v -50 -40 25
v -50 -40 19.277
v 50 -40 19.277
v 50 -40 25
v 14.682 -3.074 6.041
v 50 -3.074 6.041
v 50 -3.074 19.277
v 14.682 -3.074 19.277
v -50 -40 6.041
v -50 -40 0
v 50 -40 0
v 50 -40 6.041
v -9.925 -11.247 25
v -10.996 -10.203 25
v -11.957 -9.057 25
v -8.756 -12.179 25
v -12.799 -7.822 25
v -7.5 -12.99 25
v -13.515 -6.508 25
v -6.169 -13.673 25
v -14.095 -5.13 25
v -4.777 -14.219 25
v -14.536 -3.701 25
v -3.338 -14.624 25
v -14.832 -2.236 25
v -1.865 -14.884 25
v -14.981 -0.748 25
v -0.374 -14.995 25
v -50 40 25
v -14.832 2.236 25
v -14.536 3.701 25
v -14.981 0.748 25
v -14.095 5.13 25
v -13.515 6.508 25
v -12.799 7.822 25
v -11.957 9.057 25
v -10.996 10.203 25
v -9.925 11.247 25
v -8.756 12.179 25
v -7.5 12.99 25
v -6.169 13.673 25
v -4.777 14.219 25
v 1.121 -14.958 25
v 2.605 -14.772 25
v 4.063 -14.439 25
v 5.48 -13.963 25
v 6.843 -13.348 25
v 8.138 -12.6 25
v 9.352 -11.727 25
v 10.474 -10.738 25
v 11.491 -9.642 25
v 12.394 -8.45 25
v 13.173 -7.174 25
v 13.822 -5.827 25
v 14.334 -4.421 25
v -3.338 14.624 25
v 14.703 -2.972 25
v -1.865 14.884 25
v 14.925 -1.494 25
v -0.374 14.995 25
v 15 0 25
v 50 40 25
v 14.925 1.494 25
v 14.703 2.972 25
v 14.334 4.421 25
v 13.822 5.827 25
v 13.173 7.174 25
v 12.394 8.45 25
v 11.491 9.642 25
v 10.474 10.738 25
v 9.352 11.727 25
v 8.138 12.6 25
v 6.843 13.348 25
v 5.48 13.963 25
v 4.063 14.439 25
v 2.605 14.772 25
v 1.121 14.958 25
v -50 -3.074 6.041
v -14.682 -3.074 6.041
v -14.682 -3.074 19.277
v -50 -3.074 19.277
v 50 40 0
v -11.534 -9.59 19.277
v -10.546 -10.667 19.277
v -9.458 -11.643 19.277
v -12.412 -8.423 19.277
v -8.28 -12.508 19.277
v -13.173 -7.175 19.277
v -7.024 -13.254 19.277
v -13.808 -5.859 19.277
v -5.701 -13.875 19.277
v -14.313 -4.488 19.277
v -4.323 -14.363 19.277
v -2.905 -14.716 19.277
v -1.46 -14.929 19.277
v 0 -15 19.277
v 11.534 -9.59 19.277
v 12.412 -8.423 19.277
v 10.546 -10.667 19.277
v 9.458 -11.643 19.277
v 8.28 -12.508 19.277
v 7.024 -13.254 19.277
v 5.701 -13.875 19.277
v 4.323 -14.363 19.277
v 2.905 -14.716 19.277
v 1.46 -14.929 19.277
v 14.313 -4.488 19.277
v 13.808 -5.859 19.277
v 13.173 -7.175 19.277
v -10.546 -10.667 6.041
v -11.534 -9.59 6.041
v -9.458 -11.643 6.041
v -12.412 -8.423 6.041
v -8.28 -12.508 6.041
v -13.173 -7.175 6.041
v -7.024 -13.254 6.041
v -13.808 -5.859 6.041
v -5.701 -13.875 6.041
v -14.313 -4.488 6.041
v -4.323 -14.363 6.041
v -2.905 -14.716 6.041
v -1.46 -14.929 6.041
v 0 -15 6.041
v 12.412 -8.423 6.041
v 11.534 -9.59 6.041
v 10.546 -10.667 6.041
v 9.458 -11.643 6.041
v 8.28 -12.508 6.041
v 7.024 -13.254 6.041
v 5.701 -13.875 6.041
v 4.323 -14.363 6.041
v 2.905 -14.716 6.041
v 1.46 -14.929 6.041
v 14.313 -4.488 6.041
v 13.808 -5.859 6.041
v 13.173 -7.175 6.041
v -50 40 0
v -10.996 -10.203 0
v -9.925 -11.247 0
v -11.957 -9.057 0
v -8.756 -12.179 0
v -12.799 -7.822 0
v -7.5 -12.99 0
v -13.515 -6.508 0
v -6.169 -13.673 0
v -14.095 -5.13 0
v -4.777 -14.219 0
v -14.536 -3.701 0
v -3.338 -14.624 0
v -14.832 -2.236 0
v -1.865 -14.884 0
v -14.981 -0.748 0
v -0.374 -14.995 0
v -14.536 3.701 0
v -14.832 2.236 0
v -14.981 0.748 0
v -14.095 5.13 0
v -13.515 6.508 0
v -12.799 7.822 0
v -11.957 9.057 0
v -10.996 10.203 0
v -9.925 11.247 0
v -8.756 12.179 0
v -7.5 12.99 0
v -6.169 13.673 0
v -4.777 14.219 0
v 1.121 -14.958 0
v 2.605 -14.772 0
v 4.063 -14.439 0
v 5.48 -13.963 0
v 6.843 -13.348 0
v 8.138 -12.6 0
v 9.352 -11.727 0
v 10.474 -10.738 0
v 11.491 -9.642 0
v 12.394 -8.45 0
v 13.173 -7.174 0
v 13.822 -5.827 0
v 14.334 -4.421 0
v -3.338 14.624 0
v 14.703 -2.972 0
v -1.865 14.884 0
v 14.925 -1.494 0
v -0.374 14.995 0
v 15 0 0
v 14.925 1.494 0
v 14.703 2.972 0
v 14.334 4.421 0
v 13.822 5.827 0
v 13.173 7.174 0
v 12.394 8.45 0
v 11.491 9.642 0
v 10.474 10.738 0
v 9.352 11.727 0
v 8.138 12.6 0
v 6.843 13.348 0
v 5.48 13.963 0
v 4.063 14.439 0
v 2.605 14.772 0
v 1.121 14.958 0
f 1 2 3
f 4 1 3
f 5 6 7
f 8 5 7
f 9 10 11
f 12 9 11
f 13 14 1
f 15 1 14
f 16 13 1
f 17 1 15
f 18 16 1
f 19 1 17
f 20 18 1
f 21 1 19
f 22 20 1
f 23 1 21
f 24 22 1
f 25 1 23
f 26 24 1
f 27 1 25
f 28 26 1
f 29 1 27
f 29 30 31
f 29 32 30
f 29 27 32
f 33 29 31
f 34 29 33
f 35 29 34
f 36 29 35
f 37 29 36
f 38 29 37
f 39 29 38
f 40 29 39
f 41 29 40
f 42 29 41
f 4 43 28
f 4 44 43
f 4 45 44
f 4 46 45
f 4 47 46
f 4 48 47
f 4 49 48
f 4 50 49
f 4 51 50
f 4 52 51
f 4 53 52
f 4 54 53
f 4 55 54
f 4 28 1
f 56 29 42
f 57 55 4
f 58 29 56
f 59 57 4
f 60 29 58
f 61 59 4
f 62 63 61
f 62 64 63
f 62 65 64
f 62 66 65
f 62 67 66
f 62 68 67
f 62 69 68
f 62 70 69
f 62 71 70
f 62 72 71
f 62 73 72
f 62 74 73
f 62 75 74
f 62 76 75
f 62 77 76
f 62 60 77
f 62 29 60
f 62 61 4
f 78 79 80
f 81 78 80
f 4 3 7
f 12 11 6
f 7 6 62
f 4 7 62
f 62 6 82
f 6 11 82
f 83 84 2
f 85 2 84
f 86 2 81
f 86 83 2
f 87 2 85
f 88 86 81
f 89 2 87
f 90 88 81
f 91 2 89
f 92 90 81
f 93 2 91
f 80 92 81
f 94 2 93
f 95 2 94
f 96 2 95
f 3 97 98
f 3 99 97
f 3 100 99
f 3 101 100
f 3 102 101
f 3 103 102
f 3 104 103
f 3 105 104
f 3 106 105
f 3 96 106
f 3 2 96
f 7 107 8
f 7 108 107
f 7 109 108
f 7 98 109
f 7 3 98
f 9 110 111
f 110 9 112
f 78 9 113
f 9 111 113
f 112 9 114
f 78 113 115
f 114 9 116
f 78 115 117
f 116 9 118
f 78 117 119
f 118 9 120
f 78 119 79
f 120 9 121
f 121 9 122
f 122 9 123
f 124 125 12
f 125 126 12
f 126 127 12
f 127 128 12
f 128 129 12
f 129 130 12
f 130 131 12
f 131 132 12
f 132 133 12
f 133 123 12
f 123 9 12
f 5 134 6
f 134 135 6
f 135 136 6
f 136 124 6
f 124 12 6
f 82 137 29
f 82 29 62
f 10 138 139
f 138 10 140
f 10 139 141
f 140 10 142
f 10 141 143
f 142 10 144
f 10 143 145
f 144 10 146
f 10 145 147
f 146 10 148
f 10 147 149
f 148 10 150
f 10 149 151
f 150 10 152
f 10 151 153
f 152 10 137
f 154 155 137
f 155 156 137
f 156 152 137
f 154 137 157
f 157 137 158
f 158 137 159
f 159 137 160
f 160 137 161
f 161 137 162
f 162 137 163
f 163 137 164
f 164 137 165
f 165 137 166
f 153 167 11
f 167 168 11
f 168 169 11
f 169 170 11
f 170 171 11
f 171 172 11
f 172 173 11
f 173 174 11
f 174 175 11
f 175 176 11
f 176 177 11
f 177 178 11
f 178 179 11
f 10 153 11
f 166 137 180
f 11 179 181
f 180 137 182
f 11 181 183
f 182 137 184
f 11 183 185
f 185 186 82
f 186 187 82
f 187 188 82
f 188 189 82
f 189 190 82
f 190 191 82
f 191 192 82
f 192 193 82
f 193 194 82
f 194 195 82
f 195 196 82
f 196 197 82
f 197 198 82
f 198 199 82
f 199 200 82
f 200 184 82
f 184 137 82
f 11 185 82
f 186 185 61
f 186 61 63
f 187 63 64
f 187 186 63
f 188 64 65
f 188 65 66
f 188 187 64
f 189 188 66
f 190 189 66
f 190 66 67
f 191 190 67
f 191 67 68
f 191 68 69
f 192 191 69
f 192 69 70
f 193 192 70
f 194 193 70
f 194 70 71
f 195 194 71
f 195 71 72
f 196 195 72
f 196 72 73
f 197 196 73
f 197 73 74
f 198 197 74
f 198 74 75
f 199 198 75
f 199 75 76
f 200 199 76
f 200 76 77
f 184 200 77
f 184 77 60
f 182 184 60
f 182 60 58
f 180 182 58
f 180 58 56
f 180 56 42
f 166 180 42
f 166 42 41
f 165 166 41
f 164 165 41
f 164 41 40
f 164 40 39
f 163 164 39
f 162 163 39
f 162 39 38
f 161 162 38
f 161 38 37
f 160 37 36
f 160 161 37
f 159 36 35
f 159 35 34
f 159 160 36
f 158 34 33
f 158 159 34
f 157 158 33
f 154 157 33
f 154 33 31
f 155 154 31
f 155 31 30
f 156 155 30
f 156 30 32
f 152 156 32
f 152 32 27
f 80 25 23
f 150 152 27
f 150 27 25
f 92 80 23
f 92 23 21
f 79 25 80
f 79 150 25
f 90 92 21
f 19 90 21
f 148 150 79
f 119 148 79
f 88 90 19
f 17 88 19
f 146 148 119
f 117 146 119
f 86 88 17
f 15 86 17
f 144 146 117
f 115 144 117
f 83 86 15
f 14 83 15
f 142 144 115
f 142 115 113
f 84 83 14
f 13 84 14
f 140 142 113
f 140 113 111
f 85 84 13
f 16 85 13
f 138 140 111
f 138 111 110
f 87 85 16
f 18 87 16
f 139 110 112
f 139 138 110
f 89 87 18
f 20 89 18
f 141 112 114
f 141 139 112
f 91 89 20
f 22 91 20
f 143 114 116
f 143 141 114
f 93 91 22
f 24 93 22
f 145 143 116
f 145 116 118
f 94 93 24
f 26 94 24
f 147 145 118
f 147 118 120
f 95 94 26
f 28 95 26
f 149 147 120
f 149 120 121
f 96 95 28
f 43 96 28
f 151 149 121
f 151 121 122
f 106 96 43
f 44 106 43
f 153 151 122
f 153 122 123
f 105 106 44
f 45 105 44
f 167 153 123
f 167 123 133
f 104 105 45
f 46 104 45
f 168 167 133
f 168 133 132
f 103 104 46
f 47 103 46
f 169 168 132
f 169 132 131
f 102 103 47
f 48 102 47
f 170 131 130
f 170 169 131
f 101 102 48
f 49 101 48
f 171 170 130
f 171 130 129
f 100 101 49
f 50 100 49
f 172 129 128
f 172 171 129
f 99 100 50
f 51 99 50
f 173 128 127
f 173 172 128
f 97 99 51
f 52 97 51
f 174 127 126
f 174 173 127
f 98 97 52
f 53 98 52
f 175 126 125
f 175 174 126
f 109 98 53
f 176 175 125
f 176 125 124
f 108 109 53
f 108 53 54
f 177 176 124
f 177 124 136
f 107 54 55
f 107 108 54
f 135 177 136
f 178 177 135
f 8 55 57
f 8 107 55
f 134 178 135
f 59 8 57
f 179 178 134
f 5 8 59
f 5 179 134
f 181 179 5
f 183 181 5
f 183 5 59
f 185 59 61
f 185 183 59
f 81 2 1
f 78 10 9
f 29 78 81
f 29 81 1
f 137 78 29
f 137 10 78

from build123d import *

# Parameters (mm, degrees)
F0_W     = 100
F0_H     = 80
F0_R     = 15
F1_DEPTH = 25
F2_W     = 47.389767
F2_H     = 13.236273
F3_DEPTH = 50


with BuildPart() as f1:
    # F0 (on Top) → F1 (new body)
    with BuildSketch(Plane.XY):
        Rectangle(F0_W, F0_H)
        Circle(F0_R, mode=Mode.SUBTRACT)
    extrude(amount=F1_DEPTH)

    # F2 (on Right) → F3 (cut, symmetric)
    with BuildSketch(Plane.YZ):
        with Locations((-26.768697, 12.659147)):
            Rectangle(F2_W, F2_H)
    extrude(amount=F3_DEPTH, both=True, mode=Mode.SUBTRACT)


solid = f1.part
